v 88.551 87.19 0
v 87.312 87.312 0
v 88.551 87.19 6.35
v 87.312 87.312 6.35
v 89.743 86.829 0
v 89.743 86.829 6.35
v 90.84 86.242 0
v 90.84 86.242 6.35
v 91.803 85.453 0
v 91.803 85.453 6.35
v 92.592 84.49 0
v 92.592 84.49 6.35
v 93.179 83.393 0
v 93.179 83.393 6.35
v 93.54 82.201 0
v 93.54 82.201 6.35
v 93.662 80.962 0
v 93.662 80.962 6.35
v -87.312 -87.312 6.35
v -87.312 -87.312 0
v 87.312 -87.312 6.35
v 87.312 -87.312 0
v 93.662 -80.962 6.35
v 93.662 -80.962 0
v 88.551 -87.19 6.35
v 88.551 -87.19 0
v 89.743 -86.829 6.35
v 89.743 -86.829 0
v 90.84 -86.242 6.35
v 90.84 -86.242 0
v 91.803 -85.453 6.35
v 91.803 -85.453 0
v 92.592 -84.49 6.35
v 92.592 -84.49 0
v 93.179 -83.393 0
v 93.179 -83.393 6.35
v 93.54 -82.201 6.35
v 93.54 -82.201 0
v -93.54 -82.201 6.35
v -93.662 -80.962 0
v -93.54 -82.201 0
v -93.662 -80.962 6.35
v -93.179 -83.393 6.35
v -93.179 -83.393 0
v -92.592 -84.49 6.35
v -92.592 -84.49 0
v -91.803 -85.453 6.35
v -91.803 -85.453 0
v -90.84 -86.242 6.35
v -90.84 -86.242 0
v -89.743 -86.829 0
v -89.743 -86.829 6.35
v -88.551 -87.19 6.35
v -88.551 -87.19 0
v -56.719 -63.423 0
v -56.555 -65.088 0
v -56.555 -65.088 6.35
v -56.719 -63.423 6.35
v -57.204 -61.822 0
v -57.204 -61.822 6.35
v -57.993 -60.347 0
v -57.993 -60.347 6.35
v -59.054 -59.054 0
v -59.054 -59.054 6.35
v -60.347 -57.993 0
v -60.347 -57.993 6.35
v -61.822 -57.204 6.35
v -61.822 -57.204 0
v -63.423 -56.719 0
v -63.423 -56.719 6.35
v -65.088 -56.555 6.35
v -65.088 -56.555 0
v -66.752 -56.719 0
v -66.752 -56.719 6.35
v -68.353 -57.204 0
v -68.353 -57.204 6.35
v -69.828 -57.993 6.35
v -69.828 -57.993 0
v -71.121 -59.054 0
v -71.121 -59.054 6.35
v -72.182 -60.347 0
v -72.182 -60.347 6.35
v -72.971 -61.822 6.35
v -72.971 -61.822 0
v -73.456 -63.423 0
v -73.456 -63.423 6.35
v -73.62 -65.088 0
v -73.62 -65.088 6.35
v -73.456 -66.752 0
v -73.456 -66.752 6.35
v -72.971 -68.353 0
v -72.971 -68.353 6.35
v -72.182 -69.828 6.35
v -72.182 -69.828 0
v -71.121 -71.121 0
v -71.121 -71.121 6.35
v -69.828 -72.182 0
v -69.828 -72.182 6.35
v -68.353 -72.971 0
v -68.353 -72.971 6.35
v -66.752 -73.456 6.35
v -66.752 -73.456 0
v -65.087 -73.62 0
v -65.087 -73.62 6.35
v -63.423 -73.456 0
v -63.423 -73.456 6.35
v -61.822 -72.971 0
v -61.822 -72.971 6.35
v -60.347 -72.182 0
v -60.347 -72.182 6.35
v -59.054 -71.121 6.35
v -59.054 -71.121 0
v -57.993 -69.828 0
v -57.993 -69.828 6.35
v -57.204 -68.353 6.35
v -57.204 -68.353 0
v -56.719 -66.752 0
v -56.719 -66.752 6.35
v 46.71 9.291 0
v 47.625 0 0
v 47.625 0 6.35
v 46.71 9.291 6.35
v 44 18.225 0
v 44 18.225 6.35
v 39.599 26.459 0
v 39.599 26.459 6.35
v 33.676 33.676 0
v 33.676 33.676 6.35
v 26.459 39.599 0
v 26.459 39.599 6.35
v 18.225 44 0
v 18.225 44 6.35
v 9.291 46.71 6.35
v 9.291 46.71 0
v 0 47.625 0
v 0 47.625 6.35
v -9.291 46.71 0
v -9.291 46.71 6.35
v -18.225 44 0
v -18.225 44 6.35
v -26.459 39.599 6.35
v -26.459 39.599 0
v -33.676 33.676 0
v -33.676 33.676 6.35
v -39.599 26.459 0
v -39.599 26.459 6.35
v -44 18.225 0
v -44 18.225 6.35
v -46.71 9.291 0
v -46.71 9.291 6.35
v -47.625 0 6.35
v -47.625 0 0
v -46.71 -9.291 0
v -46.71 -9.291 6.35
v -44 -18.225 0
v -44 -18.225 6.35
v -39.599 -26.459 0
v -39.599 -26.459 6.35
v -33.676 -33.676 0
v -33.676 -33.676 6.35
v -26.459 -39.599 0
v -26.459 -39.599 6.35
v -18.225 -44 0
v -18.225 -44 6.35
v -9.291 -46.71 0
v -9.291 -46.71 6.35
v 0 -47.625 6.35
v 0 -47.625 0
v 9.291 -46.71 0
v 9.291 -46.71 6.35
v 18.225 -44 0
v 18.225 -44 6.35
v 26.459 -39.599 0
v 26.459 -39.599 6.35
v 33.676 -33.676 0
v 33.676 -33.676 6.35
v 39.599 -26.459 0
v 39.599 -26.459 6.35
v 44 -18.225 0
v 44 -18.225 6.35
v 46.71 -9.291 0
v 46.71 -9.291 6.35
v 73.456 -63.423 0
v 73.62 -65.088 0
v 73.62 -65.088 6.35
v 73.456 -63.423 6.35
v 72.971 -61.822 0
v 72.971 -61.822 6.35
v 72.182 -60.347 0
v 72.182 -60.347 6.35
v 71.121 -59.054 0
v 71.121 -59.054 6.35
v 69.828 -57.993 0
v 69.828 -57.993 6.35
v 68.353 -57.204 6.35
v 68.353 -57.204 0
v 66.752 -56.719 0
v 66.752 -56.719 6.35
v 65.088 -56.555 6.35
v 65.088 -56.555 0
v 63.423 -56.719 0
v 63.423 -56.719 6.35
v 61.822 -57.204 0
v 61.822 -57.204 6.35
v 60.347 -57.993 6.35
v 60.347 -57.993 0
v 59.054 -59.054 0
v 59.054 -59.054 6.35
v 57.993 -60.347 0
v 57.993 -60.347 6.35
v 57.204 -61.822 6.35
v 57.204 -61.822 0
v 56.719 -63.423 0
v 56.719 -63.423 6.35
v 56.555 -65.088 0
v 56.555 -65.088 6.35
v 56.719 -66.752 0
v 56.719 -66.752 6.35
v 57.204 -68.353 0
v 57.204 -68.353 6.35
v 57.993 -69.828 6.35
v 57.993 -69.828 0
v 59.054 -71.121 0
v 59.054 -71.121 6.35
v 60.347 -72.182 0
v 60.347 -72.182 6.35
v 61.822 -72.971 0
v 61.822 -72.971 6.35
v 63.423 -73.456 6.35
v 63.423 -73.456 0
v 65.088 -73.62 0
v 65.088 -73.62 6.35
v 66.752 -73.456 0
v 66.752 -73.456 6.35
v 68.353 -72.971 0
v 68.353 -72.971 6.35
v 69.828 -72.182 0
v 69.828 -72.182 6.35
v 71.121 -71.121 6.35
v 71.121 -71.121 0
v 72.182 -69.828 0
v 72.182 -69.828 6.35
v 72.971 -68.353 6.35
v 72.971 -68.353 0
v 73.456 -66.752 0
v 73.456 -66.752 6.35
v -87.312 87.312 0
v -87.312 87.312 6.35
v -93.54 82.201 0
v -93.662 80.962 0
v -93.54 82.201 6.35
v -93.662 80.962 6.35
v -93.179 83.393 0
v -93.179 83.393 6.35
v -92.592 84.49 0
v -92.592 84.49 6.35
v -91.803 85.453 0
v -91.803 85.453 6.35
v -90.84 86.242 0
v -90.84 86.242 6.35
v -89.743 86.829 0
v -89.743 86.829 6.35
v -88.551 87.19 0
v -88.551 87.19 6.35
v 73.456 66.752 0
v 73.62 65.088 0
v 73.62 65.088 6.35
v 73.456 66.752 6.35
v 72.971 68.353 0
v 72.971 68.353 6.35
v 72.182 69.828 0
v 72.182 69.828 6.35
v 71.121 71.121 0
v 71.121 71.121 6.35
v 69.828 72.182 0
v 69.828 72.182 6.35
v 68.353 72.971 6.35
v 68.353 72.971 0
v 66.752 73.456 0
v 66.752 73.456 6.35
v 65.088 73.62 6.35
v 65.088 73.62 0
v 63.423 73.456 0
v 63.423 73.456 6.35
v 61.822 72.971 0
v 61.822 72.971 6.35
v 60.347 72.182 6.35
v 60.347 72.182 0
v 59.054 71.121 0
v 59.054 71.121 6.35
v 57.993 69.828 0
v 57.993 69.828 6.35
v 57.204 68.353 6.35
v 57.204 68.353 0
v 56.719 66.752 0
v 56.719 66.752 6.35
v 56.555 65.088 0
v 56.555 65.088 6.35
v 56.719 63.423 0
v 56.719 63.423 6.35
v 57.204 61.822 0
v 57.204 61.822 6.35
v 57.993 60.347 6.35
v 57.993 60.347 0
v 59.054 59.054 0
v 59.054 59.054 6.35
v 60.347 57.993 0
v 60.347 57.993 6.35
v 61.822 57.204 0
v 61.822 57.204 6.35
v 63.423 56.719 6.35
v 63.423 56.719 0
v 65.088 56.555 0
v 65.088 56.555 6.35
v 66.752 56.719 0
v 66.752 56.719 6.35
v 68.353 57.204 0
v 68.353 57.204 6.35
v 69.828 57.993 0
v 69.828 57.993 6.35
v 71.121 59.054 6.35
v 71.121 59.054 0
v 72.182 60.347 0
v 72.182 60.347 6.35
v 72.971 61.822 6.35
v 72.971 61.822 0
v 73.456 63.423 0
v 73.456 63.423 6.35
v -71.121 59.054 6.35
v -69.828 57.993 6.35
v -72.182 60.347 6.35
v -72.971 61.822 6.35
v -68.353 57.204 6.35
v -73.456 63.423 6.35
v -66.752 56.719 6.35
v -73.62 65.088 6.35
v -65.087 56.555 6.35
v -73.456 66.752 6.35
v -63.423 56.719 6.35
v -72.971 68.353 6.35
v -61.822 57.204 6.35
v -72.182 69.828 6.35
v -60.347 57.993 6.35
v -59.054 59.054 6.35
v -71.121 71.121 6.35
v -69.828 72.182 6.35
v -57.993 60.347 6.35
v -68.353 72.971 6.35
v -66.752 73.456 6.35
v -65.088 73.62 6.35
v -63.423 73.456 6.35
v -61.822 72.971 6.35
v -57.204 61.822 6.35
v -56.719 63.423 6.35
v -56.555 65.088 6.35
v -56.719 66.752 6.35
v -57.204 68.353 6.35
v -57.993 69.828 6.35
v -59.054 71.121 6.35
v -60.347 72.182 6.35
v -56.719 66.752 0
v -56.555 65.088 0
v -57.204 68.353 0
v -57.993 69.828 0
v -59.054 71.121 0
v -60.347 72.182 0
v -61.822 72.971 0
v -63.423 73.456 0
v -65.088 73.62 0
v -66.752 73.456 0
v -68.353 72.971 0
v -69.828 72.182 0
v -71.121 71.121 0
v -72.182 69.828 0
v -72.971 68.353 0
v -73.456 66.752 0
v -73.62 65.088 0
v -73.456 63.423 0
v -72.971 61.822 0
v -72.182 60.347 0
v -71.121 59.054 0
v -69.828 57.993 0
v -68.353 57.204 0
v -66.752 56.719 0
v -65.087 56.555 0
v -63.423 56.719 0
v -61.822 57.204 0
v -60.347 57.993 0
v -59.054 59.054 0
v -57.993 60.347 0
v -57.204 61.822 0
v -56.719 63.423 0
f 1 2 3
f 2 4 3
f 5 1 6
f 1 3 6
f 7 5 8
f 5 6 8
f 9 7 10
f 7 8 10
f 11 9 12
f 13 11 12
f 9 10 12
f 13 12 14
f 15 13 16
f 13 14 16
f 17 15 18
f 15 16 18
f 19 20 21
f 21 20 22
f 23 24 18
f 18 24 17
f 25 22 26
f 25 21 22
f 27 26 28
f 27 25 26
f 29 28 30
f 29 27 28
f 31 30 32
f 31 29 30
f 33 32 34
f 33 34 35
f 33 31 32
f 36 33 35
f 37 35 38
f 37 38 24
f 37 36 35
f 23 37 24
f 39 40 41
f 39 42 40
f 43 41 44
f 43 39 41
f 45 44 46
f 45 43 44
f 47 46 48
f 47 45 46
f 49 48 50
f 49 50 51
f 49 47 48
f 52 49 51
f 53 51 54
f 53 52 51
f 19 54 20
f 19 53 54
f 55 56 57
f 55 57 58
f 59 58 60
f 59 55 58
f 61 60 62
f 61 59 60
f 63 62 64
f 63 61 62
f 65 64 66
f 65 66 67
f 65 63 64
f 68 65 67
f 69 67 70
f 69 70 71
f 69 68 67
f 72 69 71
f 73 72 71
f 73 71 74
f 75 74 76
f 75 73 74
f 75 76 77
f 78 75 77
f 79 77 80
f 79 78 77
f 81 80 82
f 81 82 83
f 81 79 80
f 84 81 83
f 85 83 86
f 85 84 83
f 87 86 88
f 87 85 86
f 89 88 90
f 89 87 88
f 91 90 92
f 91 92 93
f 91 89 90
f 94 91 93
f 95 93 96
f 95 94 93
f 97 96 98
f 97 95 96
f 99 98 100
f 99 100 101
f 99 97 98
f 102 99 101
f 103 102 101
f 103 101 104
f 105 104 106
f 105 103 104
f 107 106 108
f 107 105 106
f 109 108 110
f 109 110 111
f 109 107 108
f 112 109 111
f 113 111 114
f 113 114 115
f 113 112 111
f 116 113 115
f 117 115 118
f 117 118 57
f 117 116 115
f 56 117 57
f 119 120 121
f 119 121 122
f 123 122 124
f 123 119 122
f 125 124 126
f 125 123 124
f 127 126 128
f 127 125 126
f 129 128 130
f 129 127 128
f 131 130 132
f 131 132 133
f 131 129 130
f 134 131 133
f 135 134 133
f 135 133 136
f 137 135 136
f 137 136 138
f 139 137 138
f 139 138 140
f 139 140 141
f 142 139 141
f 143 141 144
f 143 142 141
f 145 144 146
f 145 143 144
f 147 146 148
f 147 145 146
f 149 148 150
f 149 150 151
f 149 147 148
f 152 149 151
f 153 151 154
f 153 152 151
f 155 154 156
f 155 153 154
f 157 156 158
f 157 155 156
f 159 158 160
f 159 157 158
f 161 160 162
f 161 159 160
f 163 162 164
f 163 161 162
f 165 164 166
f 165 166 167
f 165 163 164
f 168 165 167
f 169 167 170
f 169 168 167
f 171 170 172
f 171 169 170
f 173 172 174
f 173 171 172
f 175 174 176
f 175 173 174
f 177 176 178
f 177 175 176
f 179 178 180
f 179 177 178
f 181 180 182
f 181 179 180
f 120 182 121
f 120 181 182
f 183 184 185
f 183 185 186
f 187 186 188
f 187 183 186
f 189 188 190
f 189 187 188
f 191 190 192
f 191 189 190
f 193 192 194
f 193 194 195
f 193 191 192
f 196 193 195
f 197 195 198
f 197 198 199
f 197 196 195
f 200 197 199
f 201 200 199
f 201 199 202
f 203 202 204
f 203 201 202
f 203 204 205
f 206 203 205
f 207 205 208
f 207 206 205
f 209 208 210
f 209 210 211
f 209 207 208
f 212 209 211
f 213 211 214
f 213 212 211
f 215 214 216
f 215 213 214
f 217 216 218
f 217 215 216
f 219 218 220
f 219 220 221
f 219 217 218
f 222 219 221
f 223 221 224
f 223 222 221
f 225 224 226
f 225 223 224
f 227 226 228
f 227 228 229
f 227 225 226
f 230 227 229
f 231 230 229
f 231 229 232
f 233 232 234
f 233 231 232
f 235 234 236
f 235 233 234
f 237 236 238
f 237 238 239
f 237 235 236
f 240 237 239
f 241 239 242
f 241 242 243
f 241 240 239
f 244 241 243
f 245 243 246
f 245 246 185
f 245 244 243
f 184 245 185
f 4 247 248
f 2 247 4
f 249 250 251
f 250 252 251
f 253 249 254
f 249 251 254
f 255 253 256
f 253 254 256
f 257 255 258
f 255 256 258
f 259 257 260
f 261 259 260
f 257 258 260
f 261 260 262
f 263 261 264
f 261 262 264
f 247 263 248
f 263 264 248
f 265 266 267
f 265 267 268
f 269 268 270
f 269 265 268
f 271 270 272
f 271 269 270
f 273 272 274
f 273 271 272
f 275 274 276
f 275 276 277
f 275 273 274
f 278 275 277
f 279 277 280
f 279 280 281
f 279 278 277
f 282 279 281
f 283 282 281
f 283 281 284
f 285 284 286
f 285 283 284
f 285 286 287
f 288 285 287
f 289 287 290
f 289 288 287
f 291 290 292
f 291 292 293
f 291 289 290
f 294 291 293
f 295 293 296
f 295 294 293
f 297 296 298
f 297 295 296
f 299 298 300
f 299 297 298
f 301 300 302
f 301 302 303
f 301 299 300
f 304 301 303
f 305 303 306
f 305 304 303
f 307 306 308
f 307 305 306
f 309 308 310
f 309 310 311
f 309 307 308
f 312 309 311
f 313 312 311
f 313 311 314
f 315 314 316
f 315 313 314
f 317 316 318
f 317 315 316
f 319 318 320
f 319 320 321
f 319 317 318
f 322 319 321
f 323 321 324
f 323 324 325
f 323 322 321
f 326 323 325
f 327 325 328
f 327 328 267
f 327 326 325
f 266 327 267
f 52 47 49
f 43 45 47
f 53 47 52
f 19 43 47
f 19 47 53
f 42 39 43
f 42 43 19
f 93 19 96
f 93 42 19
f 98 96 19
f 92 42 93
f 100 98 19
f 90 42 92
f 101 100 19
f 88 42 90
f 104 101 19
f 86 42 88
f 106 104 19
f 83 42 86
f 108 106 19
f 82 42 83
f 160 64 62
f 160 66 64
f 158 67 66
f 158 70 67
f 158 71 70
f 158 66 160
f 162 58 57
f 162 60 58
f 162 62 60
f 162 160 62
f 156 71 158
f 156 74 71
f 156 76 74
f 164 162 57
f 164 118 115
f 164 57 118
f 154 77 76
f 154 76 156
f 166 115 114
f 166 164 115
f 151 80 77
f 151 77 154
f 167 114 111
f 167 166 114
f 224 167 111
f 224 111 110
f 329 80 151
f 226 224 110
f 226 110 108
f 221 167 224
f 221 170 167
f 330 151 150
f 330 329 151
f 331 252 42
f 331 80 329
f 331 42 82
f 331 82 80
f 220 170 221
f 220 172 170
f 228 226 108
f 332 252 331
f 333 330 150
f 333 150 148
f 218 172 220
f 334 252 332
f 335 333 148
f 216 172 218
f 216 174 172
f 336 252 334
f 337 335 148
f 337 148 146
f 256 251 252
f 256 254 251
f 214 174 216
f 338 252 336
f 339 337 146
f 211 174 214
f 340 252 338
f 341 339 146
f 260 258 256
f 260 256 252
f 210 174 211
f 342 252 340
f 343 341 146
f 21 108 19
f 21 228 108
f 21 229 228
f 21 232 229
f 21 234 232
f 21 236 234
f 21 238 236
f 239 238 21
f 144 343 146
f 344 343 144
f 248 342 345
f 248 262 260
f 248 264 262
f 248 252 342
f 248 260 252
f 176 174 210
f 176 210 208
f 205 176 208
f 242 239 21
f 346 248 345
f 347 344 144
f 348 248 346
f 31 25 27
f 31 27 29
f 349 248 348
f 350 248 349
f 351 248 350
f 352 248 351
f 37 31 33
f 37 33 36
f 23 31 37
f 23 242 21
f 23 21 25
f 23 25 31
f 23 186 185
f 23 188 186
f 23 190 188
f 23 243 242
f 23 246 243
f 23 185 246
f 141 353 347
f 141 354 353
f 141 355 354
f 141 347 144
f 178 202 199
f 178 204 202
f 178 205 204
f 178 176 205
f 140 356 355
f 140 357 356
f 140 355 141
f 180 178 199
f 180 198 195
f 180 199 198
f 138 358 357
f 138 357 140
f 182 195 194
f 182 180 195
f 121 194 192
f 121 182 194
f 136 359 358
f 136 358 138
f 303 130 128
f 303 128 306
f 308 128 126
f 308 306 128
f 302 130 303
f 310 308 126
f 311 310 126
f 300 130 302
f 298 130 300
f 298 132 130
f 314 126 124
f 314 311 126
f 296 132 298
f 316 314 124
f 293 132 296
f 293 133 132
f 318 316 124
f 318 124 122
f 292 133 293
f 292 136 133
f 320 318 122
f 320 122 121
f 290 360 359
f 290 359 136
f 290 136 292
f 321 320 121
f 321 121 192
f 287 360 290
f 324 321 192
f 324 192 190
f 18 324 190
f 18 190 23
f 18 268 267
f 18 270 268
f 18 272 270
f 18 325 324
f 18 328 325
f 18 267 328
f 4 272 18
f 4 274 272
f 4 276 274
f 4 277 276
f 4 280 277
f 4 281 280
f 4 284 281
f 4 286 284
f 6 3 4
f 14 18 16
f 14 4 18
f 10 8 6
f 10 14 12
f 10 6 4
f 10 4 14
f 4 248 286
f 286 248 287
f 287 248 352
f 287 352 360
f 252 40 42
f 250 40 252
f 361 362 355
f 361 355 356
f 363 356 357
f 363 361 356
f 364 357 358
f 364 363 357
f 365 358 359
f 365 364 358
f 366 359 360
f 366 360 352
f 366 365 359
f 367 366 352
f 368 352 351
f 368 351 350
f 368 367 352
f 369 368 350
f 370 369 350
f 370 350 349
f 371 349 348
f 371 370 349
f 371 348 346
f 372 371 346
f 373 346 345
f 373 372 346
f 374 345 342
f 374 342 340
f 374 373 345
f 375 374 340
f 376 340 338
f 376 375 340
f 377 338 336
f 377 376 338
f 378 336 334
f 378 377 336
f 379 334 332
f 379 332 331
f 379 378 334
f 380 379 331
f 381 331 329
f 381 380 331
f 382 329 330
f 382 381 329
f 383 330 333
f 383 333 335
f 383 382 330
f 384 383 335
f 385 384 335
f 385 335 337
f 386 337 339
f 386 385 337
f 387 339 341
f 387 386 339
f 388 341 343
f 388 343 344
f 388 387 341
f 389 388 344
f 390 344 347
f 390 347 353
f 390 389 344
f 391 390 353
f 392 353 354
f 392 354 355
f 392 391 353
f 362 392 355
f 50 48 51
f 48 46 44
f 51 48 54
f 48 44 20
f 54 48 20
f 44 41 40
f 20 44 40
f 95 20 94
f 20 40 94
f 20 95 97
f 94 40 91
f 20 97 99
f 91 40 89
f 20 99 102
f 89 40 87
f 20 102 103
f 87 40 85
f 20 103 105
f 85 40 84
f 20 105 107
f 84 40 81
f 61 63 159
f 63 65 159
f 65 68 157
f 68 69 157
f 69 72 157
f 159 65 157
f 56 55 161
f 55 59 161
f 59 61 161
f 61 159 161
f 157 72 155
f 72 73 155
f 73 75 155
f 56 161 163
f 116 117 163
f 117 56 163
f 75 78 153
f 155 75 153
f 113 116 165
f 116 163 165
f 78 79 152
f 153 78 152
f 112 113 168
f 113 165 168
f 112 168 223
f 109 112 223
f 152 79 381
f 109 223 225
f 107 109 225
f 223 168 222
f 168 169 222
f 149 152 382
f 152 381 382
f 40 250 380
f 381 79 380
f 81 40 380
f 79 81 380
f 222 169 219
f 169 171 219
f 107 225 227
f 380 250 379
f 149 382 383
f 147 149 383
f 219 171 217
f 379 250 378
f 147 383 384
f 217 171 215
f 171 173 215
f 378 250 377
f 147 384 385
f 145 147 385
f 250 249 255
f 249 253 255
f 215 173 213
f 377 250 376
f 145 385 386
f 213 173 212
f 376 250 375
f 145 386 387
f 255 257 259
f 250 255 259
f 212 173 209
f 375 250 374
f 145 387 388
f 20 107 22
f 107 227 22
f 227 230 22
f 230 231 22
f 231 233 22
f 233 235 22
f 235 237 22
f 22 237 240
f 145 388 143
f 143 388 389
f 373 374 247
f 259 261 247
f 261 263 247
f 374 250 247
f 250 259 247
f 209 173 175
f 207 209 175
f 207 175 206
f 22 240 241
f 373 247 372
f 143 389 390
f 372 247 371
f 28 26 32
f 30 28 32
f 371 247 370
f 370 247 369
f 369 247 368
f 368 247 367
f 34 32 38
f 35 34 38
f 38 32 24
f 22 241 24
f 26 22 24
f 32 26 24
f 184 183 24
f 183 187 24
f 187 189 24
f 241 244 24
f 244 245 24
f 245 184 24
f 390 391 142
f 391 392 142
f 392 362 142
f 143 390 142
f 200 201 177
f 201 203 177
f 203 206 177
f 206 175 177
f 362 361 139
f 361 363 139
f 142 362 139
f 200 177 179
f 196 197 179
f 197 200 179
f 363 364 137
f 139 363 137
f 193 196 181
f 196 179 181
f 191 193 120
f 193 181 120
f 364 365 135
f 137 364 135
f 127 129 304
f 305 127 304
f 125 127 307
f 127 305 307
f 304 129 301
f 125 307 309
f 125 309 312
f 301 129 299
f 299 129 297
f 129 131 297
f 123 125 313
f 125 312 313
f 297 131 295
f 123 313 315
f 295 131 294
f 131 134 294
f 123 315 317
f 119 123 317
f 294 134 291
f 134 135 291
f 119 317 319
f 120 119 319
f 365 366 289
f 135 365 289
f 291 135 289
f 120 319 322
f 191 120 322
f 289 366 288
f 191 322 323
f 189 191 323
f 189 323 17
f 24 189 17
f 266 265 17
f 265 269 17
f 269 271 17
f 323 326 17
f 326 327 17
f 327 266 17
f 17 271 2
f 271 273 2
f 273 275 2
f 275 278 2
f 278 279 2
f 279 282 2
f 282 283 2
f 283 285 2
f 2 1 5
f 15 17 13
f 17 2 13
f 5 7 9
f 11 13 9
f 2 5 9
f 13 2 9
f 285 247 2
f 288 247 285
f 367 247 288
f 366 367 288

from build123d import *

# Parameters (mm, degrees)
SKETCH1_W      = 187.325
SKETCH1_H      = 174.625
SKETCH1_R      = 8.5328125
SKETCH1_R_2    = 47.625
EXTRUDE1_DEPTH = 6.35
FILLET1_R      = 6.35


with BuildPart() as part:
    # Sketch1 → Extrude1 (new body)
    with BuildSketch(Plane.XY):
        Rectangle(SKETCH1_W, SKETCH1_H)
        with Locations((-65.0875, 65.0875)):
            Circle(SKETCH1_R, mode=Mode.SUBTRACT)
        with Locations((65.0875, 65.0875)):
            Circle(SKETCH1_R, mode=Mode.SUBTRACT)
        with Locations((65.0875, -65.0875)):
            Circle(SKETCH1_R, mode=Mode.SUBTRACT)
        with Locations((-65.0875, -65.0875)):
            Circle(SKETCH1_R, mode=Mode.SUBTRACT)
        Circle(SKETCH1_R_2, mode=Mode.SUBTRACT)
    extrude(amount=EXTRUDE1_DEPTH)

    # Fillet1
    fillet1_edges = [part.edges().sort_by_distance(p)[0] for p in [
        (-93.6625, 87.3125, 3.175),
        (93.6625, 87.3125, 3.175),
        (93.6625, -87.3125, 3.175),
        (-93.6625, -87.3125, 3.175),
    ]]
    fillet(fillet1_edges, radius=FILLET1_R)


solid = part.part
